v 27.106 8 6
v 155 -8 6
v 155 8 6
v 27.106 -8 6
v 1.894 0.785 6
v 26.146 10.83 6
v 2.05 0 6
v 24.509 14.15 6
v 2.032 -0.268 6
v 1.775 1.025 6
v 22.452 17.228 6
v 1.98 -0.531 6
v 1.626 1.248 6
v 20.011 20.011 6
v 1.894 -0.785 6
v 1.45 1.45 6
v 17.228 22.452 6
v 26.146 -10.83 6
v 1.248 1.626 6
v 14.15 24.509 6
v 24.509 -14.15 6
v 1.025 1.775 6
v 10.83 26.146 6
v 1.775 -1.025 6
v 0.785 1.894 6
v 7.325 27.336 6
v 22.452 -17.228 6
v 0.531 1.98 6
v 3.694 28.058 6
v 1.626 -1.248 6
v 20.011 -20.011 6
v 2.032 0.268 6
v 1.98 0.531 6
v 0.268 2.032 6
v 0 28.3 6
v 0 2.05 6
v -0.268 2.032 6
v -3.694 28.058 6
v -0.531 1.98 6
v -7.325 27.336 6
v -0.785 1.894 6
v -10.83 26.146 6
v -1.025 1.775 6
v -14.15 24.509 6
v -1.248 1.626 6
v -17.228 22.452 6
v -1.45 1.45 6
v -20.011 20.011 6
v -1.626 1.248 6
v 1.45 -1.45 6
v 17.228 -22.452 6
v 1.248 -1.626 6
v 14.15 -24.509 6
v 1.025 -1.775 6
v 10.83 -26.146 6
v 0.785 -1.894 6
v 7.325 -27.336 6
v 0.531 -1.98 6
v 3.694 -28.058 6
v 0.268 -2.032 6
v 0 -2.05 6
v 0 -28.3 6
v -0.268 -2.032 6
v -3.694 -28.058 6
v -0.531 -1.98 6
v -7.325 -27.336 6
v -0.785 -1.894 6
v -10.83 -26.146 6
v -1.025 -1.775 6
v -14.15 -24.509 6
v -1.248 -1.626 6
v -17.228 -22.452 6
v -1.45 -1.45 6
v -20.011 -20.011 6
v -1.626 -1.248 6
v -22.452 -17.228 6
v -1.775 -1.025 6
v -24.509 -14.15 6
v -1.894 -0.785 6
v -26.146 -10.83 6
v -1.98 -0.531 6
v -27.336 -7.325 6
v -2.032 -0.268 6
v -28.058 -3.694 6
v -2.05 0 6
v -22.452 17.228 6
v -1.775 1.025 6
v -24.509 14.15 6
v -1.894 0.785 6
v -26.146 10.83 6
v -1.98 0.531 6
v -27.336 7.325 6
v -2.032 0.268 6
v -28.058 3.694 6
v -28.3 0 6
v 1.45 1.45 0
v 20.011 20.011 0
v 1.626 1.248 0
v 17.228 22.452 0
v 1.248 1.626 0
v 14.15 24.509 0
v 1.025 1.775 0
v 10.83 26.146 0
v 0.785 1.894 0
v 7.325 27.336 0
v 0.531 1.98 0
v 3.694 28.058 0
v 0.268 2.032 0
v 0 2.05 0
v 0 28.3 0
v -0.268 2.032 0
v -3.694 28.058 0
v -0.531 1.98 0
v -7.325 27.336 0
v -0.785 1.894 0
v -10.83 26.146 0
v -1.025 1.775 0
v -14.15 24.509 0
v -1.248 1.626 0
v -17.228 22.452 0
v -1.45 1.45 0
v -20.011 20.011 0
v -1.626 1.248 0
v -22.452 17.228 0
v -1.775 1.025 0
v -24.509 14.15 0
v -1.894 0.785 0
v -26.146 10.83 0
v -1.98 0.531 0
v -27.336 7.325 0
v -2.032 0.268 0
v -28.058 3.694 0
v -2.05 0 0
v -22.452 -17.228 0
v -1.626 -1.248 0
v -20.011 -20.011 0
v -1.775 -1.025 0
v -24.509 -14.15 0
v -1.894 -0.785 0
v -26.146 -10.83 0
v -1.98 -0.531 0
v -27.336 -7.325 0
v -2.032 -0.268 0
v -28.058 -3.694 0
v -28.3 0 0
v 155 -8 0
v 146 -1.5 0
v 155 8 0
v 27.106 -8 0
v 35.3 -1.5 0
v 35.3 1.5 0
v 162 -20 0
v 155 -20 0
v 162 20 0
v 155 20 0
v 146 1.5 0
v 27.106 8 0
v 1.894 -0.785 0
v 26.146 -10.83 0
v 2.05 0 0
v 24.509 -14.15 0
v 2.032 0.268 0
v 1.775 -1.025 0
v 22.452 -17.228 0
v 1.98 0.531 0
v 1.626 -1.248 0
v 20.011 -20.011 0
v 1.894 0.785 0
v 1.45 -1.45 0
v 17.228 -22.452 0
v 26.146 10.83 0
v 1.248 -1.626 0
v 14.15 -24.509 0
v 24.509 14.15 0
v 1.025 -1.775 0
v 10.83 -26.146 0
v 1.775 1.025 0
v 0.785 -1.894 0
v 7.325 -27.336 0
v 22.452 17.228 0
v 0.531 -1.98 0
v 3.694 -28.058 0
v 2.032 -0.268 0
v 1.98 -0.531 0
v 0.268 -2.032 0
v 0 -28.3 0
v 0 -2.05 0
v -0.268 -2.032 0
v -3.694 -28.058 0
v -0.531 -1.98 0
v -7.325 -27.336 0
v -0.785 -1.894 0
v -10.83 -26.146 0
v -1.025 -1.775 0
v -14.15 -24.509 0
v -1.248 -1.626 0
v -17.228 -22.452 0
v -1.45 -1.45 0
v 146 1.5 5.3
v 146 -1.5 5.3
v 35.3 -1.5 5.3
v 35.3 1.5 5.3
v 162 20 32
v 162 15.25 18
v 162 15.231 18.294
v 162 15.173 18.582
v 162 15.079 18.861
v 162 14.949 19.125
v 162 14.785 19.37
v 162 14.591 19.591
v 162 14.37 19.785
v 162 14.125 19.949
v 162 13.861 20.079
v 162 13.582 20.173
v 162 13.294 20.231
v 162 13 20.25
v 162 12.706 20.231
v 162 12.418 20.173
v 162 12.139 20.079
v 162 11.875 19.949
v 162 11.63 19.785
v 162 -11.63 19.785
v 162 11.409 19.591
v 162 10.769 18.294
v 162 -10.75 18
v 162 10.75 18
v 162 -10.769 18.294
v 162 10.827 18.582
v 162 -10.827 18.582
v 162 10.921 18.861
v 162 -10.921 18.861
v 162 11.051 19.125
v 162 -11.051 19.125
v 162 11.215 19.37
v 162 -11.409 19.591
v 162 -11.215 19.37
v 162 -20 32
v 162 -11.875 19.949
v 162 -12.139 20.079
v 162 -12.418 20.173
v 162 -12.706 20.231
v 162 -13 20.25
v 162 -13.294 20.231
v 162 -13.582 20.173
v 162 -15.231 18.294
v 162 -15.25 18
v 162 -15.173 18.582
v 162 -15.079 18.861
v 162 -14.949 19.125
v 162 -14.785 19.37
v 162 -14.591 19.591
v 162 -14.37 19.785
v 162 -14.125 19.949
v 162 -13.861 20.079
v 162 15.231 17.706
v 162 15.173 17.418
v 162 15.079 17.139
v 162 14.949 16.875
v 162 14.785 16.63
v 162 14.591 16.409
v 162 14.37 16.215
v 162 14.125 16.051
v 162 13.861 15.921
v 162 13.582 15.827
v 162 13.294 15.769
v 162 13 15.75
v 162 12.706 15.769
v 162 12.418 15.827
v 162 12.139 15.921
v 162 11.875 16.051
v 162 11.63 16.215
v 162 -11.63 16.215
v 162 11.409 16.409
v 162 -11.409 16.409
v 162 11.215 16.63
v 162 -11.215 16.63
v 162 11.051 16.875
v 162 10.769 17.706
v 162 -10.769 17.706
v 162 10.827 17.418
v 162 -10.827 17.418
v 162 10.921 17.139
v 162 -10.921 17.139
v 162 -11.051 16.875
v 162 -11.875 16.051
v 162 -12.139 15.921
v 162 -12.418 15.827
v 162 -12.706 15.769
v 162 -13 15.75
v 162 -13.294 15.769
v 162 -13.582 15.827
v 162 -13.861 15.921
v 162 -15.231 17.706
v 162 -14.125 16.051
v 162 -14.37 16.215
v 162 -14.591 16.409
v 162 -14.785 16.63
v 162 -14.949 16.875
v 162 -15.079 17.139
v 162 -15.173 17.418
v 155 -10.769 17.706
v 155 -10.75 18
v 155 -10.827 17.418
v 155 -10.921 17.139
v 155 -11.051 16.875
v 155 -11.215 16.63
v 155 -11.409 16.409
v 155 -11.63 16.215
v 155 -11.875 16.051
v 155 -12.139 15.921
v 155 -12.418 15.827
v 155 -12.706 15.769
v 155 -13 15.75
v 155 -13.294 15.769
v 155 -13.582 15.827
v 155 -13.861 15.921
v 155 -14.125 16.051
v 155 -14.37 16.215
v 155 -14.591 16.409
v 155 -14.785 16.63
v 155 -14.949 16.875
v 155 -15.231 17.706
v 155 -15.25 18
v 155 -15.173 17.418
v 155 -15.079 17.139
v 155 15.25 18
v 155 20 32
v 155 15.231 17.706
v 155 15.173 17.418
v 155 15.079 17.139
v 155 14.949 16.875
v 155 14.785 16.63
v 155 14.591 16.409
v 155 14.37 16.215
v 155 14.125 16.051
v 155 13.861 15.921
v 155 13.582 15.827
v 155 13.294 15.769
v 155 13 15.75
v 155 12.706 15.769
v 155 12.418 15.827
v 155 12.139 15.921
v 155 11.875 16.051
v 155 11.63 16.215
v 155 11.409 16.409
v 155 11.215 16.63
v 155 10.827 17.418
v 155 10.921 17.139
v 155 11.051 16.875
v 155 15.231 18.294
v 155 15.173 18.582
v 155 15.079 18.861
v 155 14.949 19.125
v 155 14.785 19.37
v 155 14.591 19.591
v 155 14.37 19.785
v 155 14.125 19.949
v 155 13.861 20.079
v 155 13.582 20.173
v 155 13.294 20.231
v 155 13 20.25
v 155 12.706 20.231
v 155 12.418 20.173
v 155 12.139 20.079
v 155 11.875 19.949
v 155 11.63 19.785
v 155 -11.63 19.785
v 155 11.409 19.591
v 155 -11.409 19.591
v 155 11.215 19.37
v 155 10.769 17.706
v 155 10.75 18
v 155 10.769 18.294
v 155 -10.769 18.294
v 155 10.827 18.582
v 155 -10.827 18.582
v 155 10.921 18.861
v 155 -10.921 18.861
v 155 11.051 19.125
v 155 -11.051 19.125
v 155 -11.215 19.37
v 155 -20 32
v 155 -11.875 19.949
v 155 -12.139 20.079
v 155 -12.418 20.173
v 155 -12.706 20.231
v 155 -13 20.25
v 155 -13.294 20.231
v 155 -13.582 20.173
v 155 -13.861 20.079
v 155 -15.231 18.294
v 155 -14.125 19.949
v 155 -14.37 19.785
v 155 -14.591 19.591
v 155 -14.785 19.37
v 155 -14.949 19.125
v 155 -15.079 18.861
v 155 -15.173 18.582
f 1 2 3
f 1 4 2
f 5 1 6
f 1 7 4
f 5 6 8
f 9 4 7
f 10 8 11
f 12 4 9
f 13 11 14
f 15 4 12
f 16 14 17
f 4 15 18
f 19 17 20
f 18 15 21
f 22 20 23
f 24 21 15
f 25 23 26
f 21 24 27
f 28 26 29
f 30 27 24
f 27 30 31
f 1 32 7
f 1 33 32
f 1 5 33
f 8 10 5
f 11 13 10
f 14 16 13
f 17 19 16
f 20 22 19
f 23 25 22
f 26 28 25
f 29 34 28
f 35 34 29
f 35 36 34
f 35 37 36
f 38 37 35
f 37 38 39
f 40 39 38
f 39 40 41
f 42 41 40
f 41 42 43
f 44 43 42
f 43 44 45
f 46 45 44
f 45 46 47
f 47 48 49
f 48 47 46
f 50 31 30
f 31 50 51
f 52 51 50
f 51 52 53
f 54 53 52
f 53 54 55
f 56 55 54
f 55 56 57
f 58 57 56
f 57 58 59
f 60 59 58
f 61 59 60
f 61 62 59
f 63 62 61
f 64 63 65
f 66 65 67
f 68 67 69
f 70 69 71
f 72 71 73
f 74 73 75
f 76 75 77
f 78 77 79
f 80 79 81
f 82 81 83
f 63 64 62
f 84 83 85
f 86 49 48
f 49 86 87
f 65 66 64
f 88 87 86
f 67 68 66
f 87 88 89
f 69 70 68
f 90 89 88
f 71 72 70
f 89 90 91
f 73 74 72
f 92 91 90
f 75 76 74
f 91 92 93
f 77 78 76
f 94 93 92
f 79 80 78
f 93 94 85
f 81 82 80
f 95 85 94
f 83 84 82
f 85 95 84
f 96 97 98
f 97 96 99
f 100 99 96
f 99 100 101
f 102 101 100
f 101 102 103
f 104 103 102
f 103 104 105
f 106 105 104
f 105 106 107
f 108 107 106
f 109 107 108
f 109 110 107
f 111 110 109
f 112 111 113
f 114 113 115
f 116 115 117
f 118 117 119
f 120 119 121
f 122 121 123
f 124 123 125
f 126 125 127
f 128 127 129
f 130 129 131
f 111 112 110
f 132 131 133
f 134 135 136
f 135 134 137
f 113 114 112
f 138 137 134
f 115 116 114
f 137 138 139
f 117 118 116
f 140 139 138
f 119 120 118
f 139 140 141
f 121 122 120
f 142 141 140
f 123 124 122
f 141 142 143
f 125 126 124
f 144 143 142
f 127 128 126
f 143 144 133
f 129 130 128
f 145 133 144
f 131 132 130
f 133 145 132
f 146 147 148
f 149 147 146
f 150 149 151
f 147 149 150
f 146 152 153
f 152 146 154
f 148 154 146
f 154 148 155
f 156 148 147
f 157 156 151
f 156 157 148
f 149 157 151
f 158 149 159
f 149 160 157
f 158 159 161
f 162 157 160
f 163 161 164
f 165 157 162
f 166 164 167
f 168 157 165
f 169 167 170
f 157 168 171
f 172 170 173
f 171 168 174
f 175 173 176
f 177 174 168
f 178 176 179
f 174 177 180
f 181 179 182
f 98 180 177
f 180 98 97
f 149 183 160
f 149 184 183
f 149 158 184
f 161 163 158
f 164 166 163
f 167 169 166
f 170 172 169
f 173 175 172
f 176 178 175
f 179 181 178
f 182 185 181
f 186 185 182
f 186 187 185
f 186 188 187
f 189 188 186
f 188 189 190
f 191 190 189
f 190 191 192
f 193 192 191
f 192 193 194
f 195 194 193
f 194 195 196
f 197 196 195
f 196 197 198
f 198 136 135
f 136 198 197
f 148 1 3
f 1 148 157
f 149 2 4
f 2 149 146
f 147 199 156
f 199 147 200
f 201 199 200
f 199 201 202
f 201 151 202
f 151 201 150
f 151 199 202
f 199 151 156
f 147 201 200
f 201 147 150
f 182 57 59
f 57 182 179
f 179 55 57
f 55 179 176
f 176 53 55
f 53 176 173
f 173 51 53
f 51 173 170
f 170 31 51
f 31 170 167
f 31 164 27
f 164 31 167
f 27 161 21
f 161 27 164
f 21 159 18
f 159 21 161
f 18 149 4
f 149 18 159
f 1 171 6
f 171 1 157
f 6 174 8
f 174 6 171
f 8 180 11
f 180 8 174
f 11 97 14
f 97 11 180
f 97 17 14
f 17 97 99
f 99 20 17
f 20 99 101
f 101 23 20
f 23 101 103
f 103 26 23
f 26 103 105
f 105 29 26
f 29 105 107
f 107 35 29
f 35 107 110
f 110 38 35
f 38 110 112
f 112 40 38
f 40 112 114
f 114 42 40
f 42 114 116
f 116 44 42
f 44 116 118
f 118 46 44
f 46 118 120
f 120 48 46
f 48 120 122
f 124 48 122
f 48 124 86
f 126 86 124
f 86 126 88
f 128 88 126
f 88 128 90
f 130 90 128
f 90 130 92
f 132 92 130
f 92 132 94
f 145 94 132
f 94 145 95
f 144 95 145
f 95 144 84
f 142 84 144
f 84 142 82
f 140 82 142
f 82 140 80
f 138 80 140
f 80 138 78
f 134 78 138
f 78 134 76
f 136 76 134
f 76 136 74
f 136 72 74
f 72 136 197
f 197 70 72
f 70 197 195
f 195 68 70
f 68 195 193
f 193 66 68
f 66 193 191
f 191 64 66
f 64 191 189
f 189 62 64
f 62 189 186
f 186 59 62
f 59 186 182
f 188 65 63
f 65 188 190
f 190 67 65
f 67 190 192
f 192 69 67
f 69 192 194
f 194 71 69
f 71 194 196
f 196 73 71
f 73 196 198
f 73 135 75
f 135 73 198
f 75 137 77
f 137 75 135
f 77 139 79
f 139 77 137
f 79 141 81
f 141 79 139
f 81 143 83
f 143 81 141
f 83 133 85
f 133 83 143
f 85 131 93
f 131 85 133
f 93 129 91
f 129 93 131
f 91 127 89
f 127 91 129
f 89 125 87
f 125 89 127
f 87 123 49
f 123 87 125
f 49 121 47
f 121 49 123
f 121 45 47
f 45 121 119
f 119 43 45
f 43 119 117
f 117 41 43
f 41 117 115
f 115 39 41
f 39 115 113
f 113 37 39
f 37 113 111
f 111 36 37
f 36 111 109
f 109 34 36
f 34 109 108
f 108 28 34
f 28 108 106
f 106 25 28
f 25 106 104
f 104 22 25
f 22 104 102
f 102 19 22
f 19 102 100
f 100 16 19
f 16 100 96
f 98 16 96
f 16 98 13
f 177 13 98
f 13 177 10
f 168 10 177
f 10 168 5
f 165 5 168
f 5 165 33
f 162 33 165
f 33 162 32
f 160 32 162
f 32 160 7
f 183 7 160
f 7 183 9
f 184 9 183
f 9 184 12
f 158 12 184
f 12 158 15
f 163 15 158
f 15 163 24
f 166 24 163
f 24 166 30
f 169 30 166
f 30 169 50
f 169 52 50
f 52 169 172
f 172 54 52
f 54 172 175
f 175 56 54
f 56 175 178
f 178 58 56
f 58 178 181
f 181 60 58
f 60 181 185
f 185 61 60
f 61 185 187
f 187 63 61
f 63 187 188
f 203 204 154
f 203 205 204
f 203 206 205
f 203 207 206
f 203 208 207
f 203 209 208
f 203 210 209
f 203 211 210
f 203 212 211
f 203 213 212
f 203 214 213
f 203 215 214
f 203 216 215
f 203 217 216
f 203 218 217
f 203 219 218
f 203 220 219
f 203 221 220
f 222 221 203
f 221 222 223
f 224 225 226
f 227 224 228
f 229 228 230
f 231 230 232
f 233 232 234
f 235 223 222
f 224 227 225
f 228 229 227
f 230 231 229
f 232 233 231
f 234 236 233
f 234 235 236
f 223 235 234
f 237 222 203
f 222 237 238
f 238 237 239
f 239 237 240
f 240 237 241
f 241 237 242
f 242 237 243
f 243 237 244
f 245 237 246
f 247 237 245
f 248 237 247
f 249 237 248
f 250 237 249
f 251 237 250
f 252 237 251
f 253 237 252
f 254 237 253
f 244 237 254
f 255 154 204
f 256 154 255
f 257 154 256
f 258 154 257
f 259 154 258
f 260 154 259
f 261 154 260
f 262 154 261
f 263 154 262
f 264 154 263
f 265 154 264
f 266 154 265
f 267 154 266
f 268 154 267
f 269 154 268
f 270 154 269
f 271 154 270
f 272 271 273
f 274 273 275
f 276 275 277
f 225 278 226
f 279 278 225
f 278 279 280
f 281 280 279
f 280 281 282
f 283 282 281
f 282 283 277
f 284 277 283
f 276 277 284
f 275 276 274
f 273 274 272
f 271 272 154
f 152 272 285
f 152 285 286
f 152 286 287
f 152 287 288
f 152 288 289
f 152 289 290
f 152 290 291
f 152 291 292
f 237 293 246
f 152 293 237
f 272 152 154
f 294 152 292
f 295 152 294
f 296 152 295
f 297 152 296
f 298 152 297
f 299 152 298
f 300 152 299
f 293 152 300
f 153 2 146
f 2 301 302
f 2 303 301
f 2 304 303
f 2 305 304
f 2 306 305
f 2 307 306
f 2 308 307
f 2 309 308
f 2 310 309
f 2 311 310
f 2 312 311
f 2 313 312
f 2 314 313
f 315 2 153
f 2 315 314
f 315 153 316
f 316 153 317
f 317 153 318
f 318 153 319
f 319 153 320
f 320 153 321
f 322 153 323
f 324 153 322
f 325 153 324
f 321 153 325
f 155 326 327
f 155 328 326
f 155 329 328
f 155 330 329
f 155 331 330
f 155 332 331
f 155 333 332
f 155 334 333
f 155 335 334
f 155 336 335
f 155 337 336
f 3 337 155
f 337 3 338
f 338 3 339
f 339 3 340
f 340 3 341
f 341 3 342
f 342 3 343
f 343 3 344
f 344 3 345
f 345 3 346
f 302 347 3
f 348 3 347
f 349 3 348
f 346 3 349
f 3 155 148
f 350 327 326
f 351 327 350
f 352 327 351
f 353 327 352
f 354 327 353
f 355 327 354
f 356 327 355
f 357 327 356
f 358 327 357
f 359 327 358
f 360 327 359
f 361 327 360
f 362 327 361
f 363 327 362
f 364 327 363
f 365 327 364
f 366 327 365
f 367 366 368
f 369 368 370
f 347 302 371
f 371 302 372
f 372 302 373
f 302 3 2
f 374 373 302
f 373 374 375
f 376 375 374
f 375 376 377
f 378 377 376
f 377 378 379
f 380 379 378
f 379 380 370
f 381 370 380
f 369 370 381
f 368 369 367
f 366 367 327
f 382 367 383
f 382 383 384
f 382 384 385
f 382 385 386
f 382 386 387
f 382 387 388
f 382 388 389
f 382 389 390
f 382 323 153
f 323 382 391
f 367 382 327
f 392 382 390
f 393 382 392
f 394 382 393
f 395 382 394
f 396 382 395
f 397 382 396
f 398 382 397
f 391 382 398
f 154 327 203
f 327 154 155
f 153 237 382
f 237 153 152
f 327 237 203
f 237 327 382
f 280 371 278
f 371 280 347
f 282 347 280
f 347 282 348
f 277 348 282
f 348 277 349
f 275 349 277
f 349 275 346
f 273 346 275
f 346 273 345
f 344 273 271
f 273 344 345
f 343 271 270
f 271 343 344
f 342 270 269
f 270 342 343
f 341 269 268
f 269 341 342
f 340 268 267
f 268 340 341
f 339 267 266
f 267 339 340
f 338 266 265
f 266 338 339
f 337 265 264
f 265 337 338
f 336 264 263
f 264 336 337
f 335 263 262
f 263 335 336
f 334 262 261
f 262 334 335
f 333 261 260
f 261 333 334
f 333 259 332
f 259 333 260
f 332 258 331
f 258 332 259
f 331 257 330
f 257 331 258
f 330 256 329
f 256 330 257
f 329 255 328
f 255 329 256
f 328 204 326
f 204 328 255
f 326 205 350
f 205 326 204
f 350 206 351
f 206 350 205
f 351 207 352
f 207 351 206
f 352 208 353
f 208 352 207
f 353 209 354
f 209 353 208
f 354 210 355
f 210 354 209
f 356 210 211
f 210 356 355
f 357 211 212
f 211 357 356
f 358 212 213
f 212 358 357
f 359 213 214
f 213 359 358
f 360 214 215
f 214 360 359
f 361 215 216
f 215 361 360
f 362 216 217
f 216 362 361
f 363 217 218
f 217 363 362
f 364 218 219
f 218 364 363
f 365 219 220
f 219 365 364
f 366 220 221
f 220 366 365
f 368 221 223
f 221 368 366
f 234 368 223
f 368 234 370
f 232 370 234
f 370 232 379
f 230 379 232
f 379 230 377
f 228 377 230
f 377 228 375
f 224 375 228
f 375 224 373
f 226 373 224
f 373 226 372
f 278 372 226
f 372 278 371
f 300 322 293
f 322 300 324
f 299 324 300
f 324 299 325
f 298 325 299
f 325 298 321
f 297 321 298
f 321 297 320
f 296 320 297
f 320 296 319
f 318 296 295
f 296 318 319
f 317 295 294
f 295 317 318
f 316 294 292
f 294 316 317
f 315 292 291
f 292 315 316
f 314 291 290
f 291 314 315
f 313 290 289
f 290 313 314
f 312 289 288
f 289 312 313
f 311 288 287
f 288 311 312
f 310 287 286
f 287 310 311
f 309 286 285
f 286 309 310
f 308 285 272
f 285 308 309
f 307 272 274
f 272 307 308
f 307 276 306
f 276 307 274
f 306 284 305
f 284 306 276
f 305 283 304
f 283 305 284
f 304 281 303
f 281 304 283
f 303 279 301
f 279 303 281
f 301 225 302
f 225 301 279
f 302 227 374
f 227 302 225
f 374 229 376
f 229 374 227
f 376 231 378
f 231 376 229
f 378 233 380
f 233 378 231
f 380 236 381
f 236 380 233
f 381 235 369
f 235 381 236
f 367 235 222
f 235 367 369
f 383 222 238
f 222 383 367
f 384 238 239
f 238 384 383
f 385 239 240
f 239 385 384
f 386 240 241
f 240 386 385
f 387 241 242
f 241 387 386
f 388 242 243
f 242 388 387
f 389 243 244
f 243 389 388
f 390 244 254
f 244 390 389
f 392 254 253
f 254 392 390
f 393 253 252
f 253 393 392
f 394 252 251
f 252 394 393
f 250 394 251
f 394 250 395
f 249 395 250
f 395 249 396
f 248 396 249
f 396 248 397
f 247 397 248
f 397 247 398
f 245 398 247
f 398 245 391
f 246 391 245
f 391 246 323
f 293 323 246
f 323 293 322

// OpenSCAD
// =============================================================================
// arm.scad - Lengan kamera + engsel kemiringan
// =============================================================================
//  Menghubungkan flange mount_base.scad ke enclosure.scad (kamera + Pi 4B).
//
//  Orientasi: flange mount di titik asal, lengan memanjang ke +X, lalu
//  kepala dimiringkan sebesar sudut_kemiringan.
//     sudut_kemiringan = 0   -> optik mendatar (sepanjang lengan)
//     sudut_kemiringan = 90  -> optik lurus ke bawah (top-down ke bed)
//
//  RANGKAIAN UJUNG LENGAN
//    rotate([0,-90,0]) Needed untuk memutar enclosure supaya paddle di
//    dinding +X menjadi normal +Z, yaitu menghadap pelat ujung lengan.
//    Optik jadi mendatar sepanjang lengan, sehingga bisa dimiringkan oleh
//    engsel berporos Y.
//    Geser X sebesar encl_d/2 karena pusat simetri enclosure ada di
//    tengah-tebalnya, sedangkan paddle ada di sisi +X.
// =============================================================================

tampilkan_standalone_ov = false;
include <enclosure.scad>
include <params.scad>

eps       = toleransi_cetak;
flange_d  = flange_d_efektif;   // ikut menyesuaikan ukuran klem mount
flange_t  = antarmuka_flange_t;

// --- Baut M5: kepala + batang, untuk sambungan flange ---
module baut_m5(kepala = 8, batang = 20, t = flange_t) {
    translate([0, 0, t]) {
        cylinder(d = kepala, h = 4);
        translate([0, 0, 4])
            cylinder(d = 5, h = batang);
    }
}

// --- Flange bawah (disambung ke mount_base) ---
// CATATAN: JANGAN pakai translate([0,0,flange_t/2]) di sini. Flange harus
// menempati z = 0 .. flange_t karena z = 0 adalah bidang mating yang
// menempel ke permukaan mount. Versi lama memakai translate tersebut
// dengan maksud "memusatkan", padahal linear_extrude sudah mulai dari 0,
// jadi flange tergeser ke z 3..9 - bidang mating meleset 3 mm ke atas.
module flange_bawah() {
    linear_extrude(height = flange_t)
        difference() {
            circle(d = flange_d);
            circle(d = diameter_baut_antarmuka_d - 0.9);
        }
}

// --- Bodi lengan ---
// x0 HARUS lebih besar dari mount_out_r (radius luar klem mount), bukan
// flange_d/2 - 6. Versi lama memakai x0 = 11, sementara klem pipa punya
// r_out 18,4 mm dan klem hollow 40x40 punya 24,3 mm - artinya batang lengan
// menembus dinding klem. Bug itu tidak terlihat di STL terpisah (lengan dan
// mount adalah dua part berbeda), baru ketahuan saat rakitan dirakit.
// Sisa 1 mm jadi celah, jadi tidak ada gesekan PETG-ke-PETG yang membuat
// lengan "nyangkut" dan susah dilepas.
module lengan() {
    x0 = mount_out_r + 1;
    x1 = panjang_lengan + pelat_ujung_panjang / 2 - flange_t; // batang berhenti di muka dalam pelat ujung
    panjang = x1 - x0;
    tengah = (x0 + x1) / 2;
    // Baris batang DISETELARASKAN dengan flange (z 0..flange_t), bukan
    // bergeser di z -3..+3 seperti versi lama. Alasannya: batang sekarang
    // duduk DI ATAS plat mount, jadi seluruh profil lengan harus mulai dari
    // z = 0. Kalau batang melayang di bawah flange, batang akan menembus
    // plat mount.
    zt = flange_t / 2;
    difference() {
        translate([tengah, 0, zt])
            cube([panjang, lebar_lengan, tebal_lengan], center = true);
        // Lubang kabel sepanjang lengan
        translate([tengah, 0, zt - tebal_lengan / 2 + diameter_ribbon / 2 + 0.8])
            cube([panjang - 20, diameter_ribbon, 6], center = true);
    }
}

// --- Pelat ujung: menyambung lengan ke paddle enclosure ---
// 2x baut M4 x 25 mengunci sudut kemiringan lewat gesekan. Kencangkan ulang
// berkala: siklus panas dan getaran bisa melonggarkan sambungan ini.
//
// BUG LAMA (tidak pernah ketahuan karena preview hanya dilihat sekilas):
// versi sebelumnya membuat pelat sebagai plat HORIZONTAL (linear_extrude
// profil datar di XY, pelat normal +Z, z 0..flange_t) dengan lubang baut
// VERTIKAL di (x=panjang_lengan, y=+/-13). Padahal tap hole paddle ada di
// muka VERTIKAL box (normal +X) sejajar sumbu X pada y=+/-13 dan setinggi
// pusat paddle (z = flange_t + paddle_tinggi/2 = 18). Akibatnya:
//   - lubang pelat dan tap paddle tidak pernah sejajar (sumbu Z vs sumbu X)
//   - pelat (x 138..162) dan paddle (x 162..173) hanya bersinggungan di
//     satu garis tepi, baut tidak bisa menembus keduanya
//   - plat horizontal juga menutup jalur box yang turun ke bawah bidang lengan
// Versi ini: pelat VERTIKAL tebal flange_t di arah X, muka luar = poros pv
// (titik duduk muka paddle), tinggi menutup seluruh footprint paddle, dan
// 2 lubang clearance M4 sepanjang sumbu X tepat sejajar tap hole paddle.
module pelat_ujung() {
    z_poros  = flange_t + paddle_tinggi / 2;             // pusat paddle (18)
    xl_out   = panjang_lengan + pelat_ujung_panjang / 2; // muka luar = poros pv (162)
    lebar_p  = paddle_lebar + 4;                         // lebar paddle + fillet r2
    tinggi_p = z_poros + paddle_tinggi / 2 + 2;          // z 0..tinggi_p: tutup paddle penuh
    translate([xl_out, -lebar_p / 2, 0])
        rotate([0, -90, 0])                              // profil -> bidang YZ, ekstrusi ke -X
            // +1 mm: ekstrusi menembus 1 mm ke dalam batang lengan (yang
            // berhenti di xl_out - flange_t) supaya union punya volume
            // intersection nyata, bukan cuma bidang bersentuhan - kalau tidak,
            // CGAL memperingatkan "not a valid 2-manifold" saat ekspor STL.
            linear_extrude(height = flange_t + 1)
                difference() {
                    square([tinggi_p, lebar_p]);
                    // Lubang clearance M4, sumbu X, sejajar tap paddle
                    // (y = +/-paddle_jarak_baut, z = z_poros).
                    for (sy = [-1, 1])
                        translate([z_poros, lebar_p / 2 + sy * paddle_jarak_baut])
                            circle(d = paddle_clr_d);
                }
}

// =============================================================================
//  KEPALA - kunci kerangka koordinat untuk kemiringan
// =============================================================================
//  Dua bug besar yang TIDAK pernah ketahuan dari STL terpisah:
//
//  1) KERANGKA KEMIRINGAN. Versi lama memakai
//     rotate([0,sudut,0]) rotate([0,-90,0]) + translate(...paddle_x_luar).
//     Translate itu hanya benar untuk sudut 0. Pada sudut 90, dua rotasi itu
//     saling meniadakan (komposisinya identitas) sehingga kepala tidak ikut
//     miring sama sekali - kamera tetap mendatar.
//
//  2) ARAH PASANG PADDLE. Paddle ada di dinding SAMPING box (+X) sementara
//     optik ada di muka -Z. Keduanya tegak lurus. Kalau kamera diarahkan lurus
//     ke bawah, sisi paddle otomatis ikut menjadi mendatar - dan karena box
//     tumbuh ke arah berlawanan dengan paddle, box akan MENYERANG batang
//     lengan. Jadi "kamera tegak ke bawah" dan "box menggantung di luar
//     lengan" tidak bisa dicapai dengan rotasi pada sumbu Y.
//
//  SOLUSI: sumbu engsel dipindah ke sumbu Y, dan pose dasar didefinisikan
//  sebagai "kamera sudah lurus ke bawah". rotate([0,0,180]) dipakai supaya sisi
//  paddle menghadap ke lengan sementara box tumbuh menjauh - persis seperti
//  lampu gantung di ujung lengan. Kemiringan diukur dari pose itu, sehingga
//  sudut_kemiringan = 0 sudah berarti KAMERA LURUS KE BAWAH, persis yang
//  dibutuhkan untuk lookdown ke bed dari frame atap.
// =============================================================================
//
//  kepala_dasar(): asal di PUSAT MUKA PADDLE, sumbu +X = arah keluar paddle,
//                  sumbu +Z = arah tutup. Box tumbuh ke -X, optik ke -Z.
module kepala_dasar() {
    translate([-paddle_x_luar, 0, -encl_d / 2])
        children();
}

module kepala_transform() {
    // Titik poros = muka luar pelat ujung yang jadi bidang mating dengan
    // paddle, setinggi pusat paddle. pv dinyatakan dalam koordinat FRAME
    // LENGAN (z = 0 = bidang mating flange ke mount), jadi seluruh rangkaian
    // WAJIB diterjemahkan ke mount_z_mating karena di assembly.scad lengan
    // duduk di z = mount_z_mating.
    //
    // BUG LAMA: translate([0,0,mount_z_mating]) tidak ada, sehingga kepala
    // (box + paddle) terlalu rendah 30 mm pada klem hollow / 6 mm pada
    // tipe pipa. Geometri lama itu sumber tiga gejala sekaligus:
    //   - profil depan: paddle menggantung jauh di bawah pelat ujung lengan
    //   - lubang pelat dan tap paddle tidak sejajar vertikal
    //   - mode ledakan: batang lengan kelihatan menembus box
    pv = [panjang_lengan + pelat_ujung_panjang / 2, 0,
          flange_t + paddle_tinggi / 2];
    translate([0, 0, mount_z_mating])
    translate(pv)
        rotate([0, sudut_kemiringan, 0])        // kemiringan terhadap pose dasar
            translate([-pv[0], 0, -pv[2]])     // geser poros ke titik asal
                translate(pv)                   // LETAKKAN kepala di ujung lengan
                    // Balik 180 derajat terhadap sumbu Z: sisi paddle menghadap
                    // lengan, box tumbuh menjauhi lengan. Tanpa ini box akan
                    // menutupi batang lengan.
                    rotate([0, 0, 180])
                        children();
}

// --- Kepala: enclosure (kamera + Pi 4B) di ujung lengan ---
// WAJIB memanggil kepala_dasar(): tanpa itu asal kerangkanya masih di pusat
// box, bukan di muka paddle, dan seluruh kepala bergeser.
module kepala_enclosure() {
    kepala_transform() kepala_dasar() enclosure_kepala();
}

// --- Jepit kamera + tutup, memakai kerangka yang sama persis ---
// Tutup dicetak dengan pelat di meja dan skirt ke ATAS, sedangkan saat
// dipasang skirt harus masuk ke BAWAH. Karena itu tutup dibalik 180 derajat.
module kepala_jepit_dan_tutup() {
    kepala_transform() kepala_dasar() {
        color("SteelBlue") camera_holder_isi();
        translate([0, 0, encl_d])
            rotate([180, 0, 0])
                color("SlateGray") enclosure_tutup();
    }
}

// Catatan PENTING untuk build: file ini mengekspor HANYA lengan. Kepala
// (enclosure) adalah part terpisah yang disambung dengan baut, jadi kalau
// ikut diekspor ke STL yang sama, slicer akan memperlakukannya sebagai satu
// benda dan salah orientasi cetak. Kepala dirender terpisah lewat
// enclosure.scad, dan digabung hanya di assembly.scad untuk pratinjau.
module arm() {
    color("DimGray") flange_bawah();
    color("DimGray") lengan();
    color("DimGray") pelat_ujung();
}

// Render mandiri. Guard-nya PENTING: karena arm.scad di-`include` oleh
// assembly.scad, panggilan arm() di baris terakhir akan ikut dieksekusi dan
// muncul lengan kedua di z = 0 (belum digeser ke mount). Variabel guard-nya
// sengaja berbeda dari tampilkan_standalone_ov, karena arm.scad sudah
// menyetel variabel itu menjadi false untuk dipakai enclosure.scad.
cetak_standalone = is_undef(cetak_standalone_ov) ? true : cetak_standalone_ov;
if (cetak_standalone) arm();
